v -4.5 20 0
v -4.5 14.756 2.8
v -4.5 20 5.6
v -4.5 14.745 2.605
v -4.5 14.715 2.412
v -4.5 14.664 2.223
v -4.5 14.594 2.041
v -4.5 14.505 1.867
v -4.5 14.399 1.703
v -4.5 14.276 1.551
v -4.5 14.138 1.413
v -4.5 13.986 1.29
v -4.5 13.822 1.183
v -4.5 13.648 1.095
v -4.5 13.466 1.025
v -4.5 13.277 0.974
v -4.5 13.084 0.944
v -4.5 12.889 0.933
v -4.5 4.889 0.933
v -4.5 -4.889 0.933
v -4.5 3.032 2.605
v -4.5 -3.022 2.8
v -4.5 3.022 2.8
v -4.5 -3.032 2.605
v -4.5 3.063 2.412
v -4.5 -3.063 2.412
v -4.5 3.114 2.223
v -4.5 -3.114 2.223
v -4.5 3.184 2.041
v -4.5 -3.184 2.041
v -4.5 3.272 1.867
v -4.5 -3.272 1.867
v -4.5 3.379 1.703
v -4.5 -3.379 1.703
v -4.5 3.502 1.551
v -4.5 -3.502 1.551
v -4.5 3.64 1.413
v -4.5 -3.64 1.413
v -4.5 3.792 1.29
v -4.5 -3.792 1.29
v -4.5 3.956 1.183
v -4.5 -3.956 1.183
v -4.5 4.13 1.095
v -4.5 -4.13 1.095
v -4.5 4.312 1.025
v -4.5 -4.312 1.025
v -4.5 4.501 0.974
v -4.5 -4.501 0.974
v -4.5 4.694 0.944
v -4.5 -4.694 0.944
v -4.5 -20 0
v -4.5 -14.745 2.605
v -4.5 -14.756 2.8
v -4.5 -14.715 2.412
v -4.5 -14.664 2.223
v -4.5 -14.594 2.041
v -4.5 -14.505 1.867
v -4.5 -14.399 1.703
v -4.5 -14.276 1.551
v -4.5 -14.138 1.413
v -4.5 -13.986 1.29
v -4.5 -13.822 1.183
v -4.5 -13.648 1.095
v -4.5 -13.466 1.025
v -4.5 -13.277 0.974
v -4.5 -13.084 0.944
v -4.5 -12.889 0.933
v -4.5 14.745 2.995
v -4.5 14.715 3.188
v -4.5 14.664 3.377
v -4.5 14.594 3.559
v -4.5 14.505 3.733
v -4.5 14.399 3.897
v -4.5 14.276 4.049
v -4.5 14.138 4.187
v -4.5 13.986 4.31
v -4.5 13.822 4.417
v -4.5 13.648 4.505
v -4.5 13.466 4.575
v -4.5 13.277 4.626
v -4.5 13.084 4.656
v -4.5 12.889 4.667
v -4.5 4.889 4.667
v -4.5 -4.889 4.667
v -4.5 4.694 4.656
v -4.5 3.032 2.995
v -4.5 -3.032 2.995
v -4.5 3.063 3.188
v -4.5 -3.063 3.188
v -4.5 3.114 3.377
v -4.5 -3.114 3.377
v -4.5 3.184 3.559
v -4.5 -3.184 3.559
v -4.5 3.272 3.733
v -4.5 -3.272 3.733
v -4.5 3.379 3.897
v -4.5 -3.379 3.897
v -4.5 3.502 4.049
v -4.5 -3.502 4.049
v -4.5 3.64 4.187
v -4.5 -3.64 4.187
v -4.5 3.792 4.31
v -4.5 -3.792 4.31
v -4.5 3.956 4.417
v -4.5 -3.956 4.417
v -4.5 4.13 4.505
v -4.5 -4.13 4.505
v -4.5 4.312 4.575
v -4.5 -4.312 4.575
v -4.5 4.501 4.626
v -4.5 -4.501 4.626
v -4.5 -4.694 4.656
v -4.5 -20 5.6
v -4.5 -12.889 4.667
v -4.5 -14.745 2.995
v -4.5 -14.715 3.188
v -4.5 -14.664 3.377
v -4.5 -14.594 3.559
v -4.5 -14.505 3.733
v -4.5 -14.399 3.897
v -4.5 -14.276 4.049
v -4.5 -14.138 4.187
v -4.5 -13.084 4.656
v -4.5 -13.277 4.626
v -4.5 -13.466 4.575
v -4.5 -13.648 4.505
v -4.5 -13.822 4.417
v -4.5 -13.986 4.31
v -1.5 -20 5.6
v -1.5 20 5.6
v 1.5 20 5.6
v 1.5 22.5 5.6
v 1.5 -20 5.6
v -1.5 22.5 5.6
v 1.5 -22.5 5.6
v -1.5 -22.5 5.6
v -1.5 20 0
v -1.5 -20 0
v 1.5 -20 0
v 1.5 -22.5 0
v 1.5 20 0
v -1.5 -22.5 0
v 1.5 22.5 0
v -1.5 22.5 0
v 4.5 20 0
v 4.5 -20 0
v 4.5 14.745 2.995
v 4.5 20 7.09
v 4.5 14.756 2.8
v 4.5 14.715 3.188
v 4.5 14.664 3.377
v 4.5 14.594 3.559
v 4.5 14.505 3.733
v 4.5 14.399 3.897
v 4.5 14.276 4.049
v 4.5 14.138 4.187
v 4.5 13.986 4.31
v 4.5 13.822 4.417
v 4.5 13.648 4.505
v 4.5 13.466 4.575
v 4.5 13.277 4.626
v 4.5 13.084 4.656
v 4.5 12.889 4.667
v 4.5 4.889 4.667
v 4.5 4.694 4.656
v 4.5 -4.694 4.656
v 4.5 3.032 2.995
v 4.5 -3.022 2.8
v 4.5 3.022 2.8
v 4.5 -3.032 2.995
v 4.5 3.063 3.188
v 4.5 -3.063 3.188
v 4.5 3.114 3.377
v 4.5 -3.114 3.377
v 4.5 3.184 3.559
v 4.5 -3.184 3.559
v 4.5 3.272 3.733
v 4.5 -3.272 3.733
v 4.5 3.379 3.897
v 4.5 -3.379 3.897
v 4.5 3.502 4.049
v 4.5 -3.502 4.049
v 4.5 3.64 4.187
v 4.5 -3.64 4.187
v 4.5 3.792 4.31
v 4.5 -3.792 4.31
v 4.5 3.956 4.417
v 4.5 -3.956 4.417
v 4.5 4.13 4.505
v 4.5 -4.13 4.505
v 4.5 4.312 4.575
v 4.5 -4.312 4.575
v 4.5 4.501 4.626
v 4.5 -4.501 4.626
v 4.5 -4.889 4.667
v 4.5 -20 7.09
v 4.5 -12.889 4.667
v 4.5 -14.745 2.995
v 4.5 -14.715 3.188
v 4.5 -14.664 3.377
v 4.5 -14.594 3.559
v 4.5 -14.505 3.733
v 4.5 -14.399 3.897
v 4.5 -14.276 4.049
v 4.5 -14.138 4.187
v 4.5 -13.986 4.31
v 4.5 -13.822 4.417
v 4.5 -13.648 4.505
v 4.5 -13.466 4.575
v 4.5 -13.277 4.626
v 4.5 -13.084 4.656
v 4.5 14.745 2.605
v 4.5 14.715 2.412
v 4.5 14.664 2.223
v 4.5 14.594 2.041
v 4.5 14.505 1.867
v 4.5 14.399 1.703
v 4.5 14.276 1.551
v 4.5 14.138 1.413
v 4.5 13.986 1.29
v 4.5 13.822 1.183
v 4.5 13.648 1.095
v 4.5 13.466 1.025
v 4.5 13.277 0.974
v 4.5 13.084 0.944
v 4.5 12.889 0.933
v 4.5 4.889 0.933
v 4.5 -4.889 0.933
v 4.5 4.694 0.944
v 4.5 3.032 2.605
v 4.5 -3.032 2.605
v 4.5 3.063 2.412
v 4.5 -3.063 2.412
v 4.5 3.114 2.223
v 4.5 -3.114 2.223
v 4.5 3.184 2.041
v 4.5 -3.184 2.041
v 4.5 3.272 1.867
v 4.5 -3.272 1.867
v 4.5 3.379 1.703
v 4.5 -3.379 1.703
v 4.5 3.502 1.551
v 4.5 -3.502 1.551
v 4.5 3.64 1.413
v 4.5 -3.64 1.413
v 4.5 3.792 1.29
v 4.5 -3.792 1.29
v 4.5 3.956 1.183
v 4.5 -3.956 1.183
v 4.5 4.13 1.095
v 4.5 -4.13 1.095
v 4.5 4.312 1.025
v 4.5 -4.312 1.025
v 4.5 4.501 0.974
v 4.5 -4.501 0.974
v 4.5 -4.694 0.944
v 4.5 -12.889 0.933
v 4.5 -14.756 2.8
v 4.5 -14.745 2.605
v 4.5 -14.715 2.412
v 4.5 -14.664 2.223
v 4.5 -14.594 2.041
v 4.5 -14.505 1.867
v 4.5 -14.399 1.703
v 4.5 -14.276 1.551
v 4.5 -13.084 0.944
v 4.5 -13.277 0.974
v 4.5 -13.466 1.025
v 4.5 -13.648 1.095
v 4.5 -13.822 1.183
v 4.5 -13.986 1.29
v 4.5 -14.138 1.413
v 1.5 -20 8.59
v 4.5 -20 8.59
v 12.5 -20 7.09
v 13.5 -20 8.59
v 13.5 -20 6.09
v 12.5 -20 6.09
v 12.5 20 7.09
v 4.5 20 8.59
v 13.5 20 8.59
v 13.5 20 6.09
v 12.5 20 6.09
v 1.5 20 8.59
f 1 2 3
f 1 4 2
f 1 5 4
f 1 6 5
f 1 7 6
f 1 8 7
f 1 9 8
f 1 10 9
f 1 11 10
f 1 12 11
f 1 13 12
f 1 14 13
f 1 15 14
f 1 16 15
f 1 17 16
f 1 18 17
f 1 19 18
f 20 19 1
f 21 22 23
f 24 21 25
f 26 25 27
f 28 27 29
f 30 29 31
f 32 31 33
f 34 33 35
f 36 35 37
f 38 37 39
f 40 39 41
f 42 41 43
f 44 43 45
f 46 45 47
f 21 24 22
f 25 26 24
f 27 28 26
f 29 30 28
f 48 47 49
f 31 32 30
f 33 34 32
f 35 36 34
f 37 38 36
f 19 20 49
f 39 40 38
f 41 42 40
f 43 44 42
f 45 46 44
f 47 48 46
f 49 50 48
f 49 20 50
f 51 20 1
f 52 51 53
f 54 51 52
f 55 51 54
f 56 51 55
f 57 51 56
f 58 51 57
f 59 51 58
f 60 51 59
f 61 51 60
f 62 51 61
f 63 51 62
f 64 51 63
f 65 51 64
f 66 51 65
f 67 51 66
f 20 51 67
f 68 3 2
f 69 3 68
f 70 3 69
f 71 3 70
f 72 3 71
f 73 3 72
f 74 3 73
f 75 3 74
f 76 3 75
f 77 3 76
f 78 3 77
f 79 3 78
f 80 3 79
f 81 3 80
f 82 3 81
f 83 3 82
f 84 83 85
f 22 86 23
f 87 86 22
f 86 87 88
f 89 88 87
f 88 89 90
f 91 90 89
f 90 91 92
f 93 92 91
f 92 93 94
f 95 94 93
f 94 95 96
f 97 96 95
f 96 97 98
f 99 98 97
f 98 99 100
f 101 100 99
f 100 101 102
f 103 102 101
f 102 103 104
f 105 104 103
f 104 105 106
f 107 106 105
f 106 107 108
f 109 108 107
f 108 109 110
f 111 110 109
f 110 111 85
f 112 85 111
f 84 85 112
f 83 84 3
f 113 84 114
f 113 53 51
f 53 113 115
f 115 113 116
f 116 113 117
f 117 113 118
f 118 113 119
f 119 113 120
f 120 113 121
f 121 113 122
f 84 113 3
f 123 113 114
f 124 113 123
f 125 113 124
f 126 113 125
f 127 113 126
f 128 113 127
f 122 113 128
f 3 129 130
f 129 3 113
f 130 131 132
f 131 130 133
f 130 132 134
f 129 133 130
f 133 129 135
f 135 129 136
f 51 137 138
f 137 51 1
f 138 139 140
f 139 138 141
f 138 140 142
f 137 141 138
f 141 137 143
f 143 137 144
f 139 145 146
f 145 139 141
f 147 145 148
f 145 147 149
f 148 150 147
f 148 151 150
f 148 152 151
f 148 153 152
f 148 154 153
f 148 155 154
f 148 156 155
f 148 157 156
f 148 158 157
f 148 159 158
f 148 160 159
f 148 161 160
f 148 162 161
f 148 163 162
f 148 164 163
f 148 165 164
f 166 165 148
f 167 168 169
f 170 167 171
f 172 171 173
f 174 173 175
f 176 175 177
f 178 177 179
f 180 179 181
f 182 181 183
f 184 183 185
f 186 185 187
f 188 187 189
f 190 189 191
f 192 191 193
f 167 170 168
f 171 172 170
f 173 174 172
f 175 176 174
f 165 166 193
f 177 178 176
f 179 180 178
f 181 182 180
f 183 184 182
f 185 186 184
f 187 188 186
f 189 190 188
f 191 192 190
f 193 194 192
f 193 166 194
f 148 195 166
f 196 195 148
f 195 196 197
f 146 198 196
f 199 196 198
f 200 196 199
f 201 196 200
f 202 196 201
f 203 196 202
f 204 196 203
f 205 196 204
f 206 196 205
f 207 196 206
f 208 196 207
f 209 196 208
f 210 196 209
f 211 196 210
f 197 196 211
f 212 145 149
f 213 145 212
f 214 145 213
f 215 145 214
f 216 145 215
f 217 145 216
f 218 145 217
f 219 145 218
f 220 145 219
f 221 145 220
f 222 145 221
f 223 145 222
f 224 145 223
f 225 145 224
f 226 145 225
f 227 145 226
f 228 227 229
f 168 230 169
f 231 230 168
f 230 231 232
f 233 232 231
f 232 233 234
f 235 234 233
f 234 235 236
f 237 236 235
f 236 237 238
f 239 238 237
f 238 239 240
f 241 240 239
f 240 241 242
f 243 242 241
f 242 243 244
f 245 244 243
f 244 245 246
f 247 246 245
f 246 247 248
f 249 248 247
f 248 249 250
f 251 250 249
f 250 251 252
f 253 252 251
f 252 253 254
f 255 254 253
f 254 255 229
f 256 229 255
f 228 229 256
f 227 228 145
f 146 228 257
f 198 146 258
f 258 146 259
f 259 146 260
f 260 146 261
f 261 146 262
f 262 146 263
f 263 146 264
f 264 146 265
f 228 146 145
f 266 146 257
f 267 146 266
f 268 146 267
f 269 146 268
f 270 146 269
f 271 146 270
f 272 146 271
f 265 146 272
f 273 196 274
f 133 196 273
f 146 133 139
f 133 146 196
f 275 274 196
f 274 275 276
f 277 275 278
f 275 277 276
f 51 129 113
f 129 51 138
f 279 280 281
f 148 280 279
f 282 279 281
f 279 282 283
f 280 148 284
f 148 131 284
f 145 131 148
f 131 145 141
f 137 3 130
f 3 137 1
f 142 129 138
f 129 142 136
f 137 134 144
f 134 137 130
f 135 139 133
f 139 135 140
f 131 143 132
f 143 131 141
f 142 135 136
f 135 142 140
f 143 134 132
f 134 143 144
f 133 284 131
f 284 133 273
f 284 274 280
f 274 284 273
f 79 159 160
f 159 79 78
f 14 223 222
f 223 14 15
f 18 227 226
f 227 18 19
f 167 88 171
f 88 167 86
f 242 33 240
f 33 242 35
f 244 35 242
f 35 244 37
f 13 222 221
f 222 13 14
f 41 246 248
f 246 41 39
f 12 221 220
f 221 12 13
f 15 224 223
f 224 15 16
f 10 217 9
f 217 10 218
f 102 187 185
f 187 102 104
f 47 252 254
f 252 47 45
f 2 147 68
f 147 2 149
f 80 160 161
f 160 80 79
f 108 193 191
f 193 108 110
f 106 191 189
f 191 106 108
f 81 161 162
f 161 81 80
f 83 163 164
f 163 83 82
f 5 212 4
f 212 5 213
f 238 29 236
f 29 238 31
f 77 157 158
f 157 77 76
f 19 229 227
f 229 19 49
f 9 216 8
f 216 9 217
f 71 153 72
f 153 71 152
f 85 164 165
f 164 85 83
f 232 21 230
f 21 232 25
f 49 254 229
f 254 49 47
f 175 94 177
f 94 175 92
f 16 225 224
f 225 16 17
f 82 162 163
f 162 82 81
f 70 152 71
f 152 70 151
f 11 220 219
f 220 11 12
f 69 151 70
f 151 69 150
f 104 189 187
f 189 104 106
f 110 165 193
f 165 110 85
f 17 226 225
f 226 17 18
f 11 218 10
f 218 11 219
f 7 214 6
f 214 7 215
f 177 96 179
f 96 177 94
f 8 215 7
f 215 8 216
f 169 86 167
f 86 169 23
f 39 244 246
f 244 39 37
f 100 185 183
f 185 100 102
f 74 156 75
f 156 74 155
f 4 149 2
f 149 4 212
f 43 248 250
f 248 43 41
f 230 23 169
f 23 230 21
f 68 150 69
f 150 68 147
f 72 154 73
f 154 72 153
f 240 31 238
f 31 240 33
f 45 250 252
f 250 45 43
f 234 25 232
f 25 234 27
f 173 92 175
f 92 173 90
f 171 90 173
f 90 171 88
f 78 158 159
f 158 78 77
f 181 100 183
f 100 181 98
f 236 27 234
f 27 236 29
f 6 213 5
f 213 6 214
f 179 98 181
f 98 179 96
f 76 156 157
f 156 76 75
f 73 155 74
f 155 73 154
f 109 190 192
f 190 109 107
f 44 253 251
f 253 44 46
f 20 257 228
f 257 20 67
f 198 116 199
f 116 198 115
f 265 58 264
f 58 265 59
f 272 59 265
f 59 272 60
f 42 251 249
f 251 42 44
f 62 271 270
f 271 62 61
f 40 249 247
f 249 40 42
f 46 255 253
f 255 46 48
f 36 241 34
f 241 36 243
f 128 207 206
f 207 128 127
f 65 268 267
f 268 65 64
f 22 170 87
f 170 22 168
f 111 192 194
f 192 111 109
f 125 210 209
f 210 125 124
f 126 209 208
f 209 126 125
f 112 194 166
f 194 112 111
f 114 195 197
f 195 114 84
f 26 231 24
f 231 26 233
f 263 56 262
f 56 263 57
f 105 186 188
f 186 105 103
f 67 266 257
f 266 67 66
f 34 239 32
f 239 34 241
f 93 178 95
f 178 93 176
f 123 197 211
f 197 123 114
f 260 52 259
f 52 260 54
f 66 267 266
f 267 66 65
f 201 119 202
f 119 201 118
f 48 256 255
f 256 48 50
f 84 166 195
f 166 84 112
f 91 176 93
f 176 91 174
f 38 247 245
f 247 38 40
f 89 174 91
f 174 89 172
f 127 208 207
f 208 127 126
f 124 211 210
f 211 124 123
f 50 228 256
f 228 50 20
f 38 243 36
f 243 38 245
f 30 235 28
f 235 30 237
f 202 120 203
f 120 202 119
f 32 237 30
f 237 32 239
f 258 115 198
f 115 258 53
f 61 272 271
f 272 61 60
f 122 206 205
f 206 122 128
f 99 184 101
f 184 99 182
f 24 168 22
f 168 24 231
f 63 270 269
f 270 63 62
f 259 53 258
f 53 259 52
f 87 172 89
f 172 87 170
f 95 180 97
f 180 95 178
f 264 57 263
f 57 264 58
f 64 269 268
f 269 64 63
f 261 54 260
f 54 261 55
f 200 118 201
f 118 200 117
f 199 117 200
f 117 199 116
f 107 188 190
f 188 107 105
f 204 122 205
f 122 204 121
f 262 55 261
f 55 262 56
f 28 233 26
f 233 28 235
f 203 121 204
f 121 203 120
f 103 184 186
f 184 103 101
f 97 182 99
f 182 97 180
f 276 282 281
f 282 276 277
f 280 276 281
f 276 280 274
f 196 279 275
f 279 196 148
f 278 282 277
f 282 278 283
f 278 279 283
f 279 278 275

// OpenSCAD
// file: gadgets.scad
module gadget(length, width, height, border_radius, clearance=0) {
    height = height + clearance;
    length = length + clearance;
    thickness = width / 3;
    translate([0, 0, height / 2]) {
        cube(size=[width, length, height], center=true);
        cube(size=[thickness + clearance, length + 5, height], center=true);
    }
    translate([-thickness, 0, height + border_radius / 2 - 0.01]) {
        cube(size=[thickness, length, border_radius], center=true);
    }
}

module button(length, height, depth, clearance=0) {
    module oblong(width, height, depth) {
        hull() {
            translate([0, width / 2, 0]) {
                cylinder(d=height - clearance, h=depth);
            }
            translate([0, -width / 2, 0]) {
                cylinder(d=height - clearance, h=depth);
            }
        }
    }

    oblong(length, height, depth);

    base_thickness = 1;
    translate([0, 0, -base_thickness / 2]) {
        oblong(length, height + 1, base_thickness);
    }
}

module gadget_button(length, width, height, border_radius, debug=false) {

    module switch() {
        length = 12.8;
        thickness = 5.8;
        height = 6.5;
        diameter = 2.2;
        difference() {
            cube(size=[length, thickness, height], center=true);
            rotate([90, 0, 0]) {
                for (pos = [
                    [-length / 2 + 3.15, -height / 2 + 1.5, -thickness],
                    [length / 2 - 3.15, -height / 2 + 1.5, -thickness],
                ]) {
                    translate(pos) {
                        cylinder(d=diameter, h=thickness * 2);
                    }
                }
            }
        }
    }

    module button_position() {
        for (i = [0 : $children - 1]) {
            for (pos = [
                [-(width + 2) / 2, -length / 4.5, height / 2],
                [-(width + 2) / 2, length / 4.5, height / 2],
            ]) {
                translate(pos) {
                    rotate([0, 90, 0]) {
                        children(i);
                    }
                }
            }
        }
    }

    rotate([0, 0, 180]) {
        difference() {
            gadget(length, width, height, border_radius);
            button_position() {
                button(length / 5, height / 1.5, width + 2);
            }
        }

        if (debug) {
            %button_position() {
                button(length / 5, height / 1.5, width + 2);

                translate([0, 0, -4]) {
                    rotate([0, 0, 90]) {
                        switch();
                    }
                }
            }
        }
    }

    // Create base
    base_thickness = 1.5;
    base_width = 9;
    translate([width / 2 + base_width / 2, 0, height + border_radius / 2 + base_thickness / 2 - 0.01]) {
        cube(size=[base_width, length, base_thickness], center=true);
        translate([base_width / 2 - 0.5, 0, -1]) {
            cube(size=[1, length, base_thickness], center=true);
        }
    }
}
// file: libs/cubeX.scad
//
// Simple and fast corned cube!
// Anaximandro de Godinho.
//

module cubeX( size, radius=1, rounded=true, center=false )
{
	l = len( size );
	if( l == undef )
		_cubeX( size, size, size, radius, rounded, center );
	else
		_cubeX( size[0], size[1], size[2], radius, rounded, center );
}

module _cubeX( x, y, z, r, rounded, center )
{
	if( rounded )
		if( center )
			translate( [-x/2, -y/2, -z/2] )
			__cubeX( x, y, z, r );
		else
			__cubeX( x, y, z, r );
	else
		cube( [x, y, z], center );
}

module __cubeX(	x, y, z, r )
{
	//TODO: discount r.
	rC = r;
	hull()
	{
		translate( [rC, rC, rC] )
			sphere( r );
		translate( [rC, y-rC, rC] )
			sphere( r );
		translate( [rC, rC, z-rC] )
			sphere( r );
		translate( [rC, y-rC, z-rC] )
			sphere( r );

		translate( [x-rC, rC, rC] )
			sphere( r );
		translate( [x-rC, y-rC, rC] )
			sphere( r );
		translate( [x-rC, rC, z-rC] )
			sphere( r );
		translate( [x-rC, y-rC, z-rC] )
			sphere( r );
	}
}
// main file
use <libs/cubeX.scad>
use <gadgets.scad>

$fn = 60;

DEBUG = false;

/* BEGIN e-Paper defintion
 *
 * Screen information https://www.waveshare.com/product/displays/e-paper/7.5inch-e-paper.htm
 * https://www.waveshare.com/product/displays/e-paper/7.5inch-e-paper.htm
 * https://www.waveshare.com/wiki/File:7.5inch-e-paper-specification.pdf
 * https://www.waveshare.com/w/upload/6/60/7.5inch_e-Paper_V2_Specification.pdf
 */
OUTLINE_LENGTH = 170.2;
OUTLINE_WIDTH = 111.2;
OUTLINE_THICKNESS = 1.18;

// Display Active Area
AA_LENGTH = 163.2;
AA_WIDTH = 97.92;

// Active Area is not centered
// 1.2 + 1.5 + 0.8: see specification "1.4 Mechanical Drawing of EPD module"
AA_BORDER_OFFSET = 1.2 + 1.5 + 0.8;
/*  END e-Paper defintion
 */

BORDER_HORIZONTAL = 10;
BORDER_VERTICAL = 14;

LENGTH = AA_LENGTH + BORDER_HORIZONTAL * 2;
WIDTH = AA_WIDTH + BORDER_VERTICAL * 2;

FRONT_THICKNESS = 3.5;

CASE_HEIGHT = 9.6;
CASE_THICKNESS = 1.;
CASE_WALL_THICKNESS = 9;

// Must be less than or equal to front thickness
BORDER_RADIUS = 3;

// Dept
DISPLAY_DEPTH = 2;

SCREEN_OFFSET = 3;

GADGET_HEIGHT = CASE_HEIGHT - BORDER_RADIUS - CASE_THICKNESS;
GADGET_WIDTH = CASE_WALL_THICKNESS;
GADGET_LENGTH = 40;

/*  Inserts definition
 */
INSERT_THREAD_DIAMETER = 2;
INSERT_DIAMETER = 3.45;
INSERT_HEIGHT = 4;


module dummy_screen(length, width, thickness, active_area_length, active_area_width, border_offset) {
    color("RED")
    cube(size=[length, width, thickness], center=true);

    color("BLACK")
    translate([0, (length - active_area_length) - border_offset, .1]) {
        cube(size=[length, width, 1], center=true);
    }

    // Display connector
    color("BLUE")
    translate([0, -width / 2, 0]) {
        cube(size=[22.04, 5, 1], center=true);
    }
}

module frame(active_area_length, active_area_width, front_thickness, display_depth) {
    // Frame opening
    opening = 6;

    // Height of the closest part of the active area
    base = 1;

    // Clearance between frame border and active area
    clearance = 0.3;

    cube(size=[AA_LENGTH + clearance, AA_WIDTH + clearance, FRONT_THICKNESS * 2], center=true);
    hull() {
        translate([0, 0, base]) {
            cube(size=[AA_LENGTH + clearance, AA_WIDTH + clearance, .01], center=true);
        }
        translate([0, 0, DISPLAY_DEPTH]) {
            cube(size=[AA_LENGTH + opening, AA_WIDTH + opening, .01], center=true);
        }
    }
}

module holes_position() {
    // Holes
    for (pos = [
        [LENGTH / 2 - BORDER_HORIZONTAL / 2 + INSERT_DIAMETER / 2, WIDTH / 2 - BORDER_VERTICAL / 2 + INSERT_DIAMETER, 0],
        [LENGTH / 2 - BORDER_HORIZONTAL / 2 + INSERT_DIAMETER / 2, -(WIDTH / 2 - BORDER_VERTICAL / 2 + INSERT_DIAMETER), 0],
        [-(LENGTH / 2 - BORDER_HORIZONTAL / 2 + INSERT_DIAMETER / 2), WIDTH / 2 - BORDER_VERTICAL / 2 + INSERT_DIAMETER, 0],
        [-(LENGTH / 2 - BORDER_HORIZONTAL / 2 + INSERT_DIAMETER / 2), -(WIDTH / 2 - BORDER_VERTICAL / 2 + INSERT_DIAMETER), 0],

        [(LENGTH / 2 - BORDER_HORIZONTAL / 2 + INSERT_DIAMETER / 2), 0, 1],
        [-(LENGTH / 2 - BORDER_HORIZONTAL / 2 + INSERT_DIAMETER / 2), 0, 1],

        [0, WIDTH / 2 - BORDER_VERTICAL / 2 + INSERT_DIAMETER, 1],
        [LENGTH / 4, WIDTH / 2 - BORDER_VERTICAL / 2 + INSERT_DIAMETER, 1],
        [-LENGTH / 4, WIDTH / 2 - BORDER_VERTICAL / 2 + INSERT_DIAMETER, 1],

        [LENGTH / 4, -(WIDTH / 2 - BORDER_VERTICAL / 2 + INSERT_DIAMETER), 1],
        [-LENGTH / 4, -(WIDTH / 2 - BORDER_VERTICAL / 2 + INSERT_DIAMETER), 1],
    ]) {
        translate([pos[0], pos[1], 0]) {
            if ($children > 1) {
                children(pos[2]);
            } else {
                children(0);
            }
        }
    }
}

/**
 *  Create the front of the case 
 *
 *  Arguments:
 *  - length            Length of the front
 *  - width             Width of the front
 *  - outline_length    Screen outline length
 *  - outline_width     Screen outline width
 *  - aa_length         Screen active area length
 *  - aa_width          Screen active area width
 *  - front_thickness   The front thickness
 *  - display_depth     TODO
 *  - border_offset     Active area is not centered
 *  - screen_offset     Screen is not vertically centered
 *  - border_radius     Border radius of the corner
 */
module front(length, width, outline_length, outline_width, aa_length, aa_width, front_thickness, display_depth, border_offset, screen_offset, border_radius) {
    clearance = 0.6;

    assert(border_radius <= front_thickness);

    difference() {
        union() {
            difference() {
                cubeX([length, width, front_thickness * 2], radius=border_radius, center=true);
                translate([0, 0, - front_thickness / 2]) {
                    cube([length, width, front_thickness], center=true);
                }
            }
        }

        translate([0, screen_offset, 0]) {
            // Screen opening
            translate([0, - border_offset, front_thickness / 2 - display_depth]) {
                cube([outline_length + clearance, outline_width + clearance, front_thickness], center=true);

                // Display connector
                translate([0, -outline_width / 2, 0]) {
                    cube([40, 6, front_thickness], center=true);
                }
            }

            // Display opening
            translate([0, 0, front_thickness - display_depth]) {
                frame(aa_length, aa_width, front_thickness, display_depth);
            }
        }

        holes_position() {
            translate([0, 0, front_thickness - 1 - INSERT_HEIGHT]) {
                cylinder(d=INSERT_DIAMETER, h=INSERT_HEIGHT);
            }
        }
    }
}

module fixation(height=CASE_HEIGHT) {
    large_diameter = 6;
    small_diameter = 2.8;
    translate([0, 0, 0]) {
        cylinder(d=large_diameter, h=height);
    }
    translate([0, 3, height / 2]) {
        cube(size=[small_diameter, 7, height], center=true);
    }
    translate([0, 6, 0]) {
        cylinder(d=small_diameter, h=height);
    }
}

module case() {

    module fixation_position() {
        translate([0, WIDTH / 2 - 25, CASE_HEIGHT]) {
            for (i = [0 : $children - 1]) {
                children(i);
            }
        }
    }

    difference() {
        cubeX([LENGTH, WIDTH, CASE_HEIGHT * 2], radius=BORDER_RADIUS, center=true);
        translate([0, 0, - CASE_HEIGHT / 2]) {
            cube([LENGTH, WIDTH, CASE_HEIGHT], center=true);
        }

        translate([0, 0, CASE_HEIGHT / 2 - CASE_THICKNESS / 2 - .01]) {
            cube([LENGTH - CASE_WALL_THICKNESS * 2, WIDTH - CASE_WALL_THICKNESS * 2, CASE_HEIGHT - CASE_THICKNESS], center=true);
        }

        holes_position() {
            union() {
                translate([0, 0, -CASE_HEIGHT / 2]) {
                    cylinder(d=INSERT_THREAD_DIAMETER, h=CASE_HEIGHT * 2);
                }
                translate([0, 0, CASE_HEIGHT / 2]) {
                    cylinder(d=4.6, h=CASE_HEIGHT * 2);
                }
                translate([0, 0, -0.01]) {
                    cylinder(d=INSERT_DIAMETER * 1.3, h=2.25);
                }
            }
            cylinder(d=0, h=0); // Dummy one
        }

        fixation_position() {
            translate([0, 0, -CASE_THICKNESS * 2 - 1]) {
                fixation(); 
            }
        }

        for (pos = [
            [[LENGTH / 2 - CASE_WALL_THICKNESS / 2, WIDTH / 4 - 3, -0.001], 0],
            [[-LENGTH / 2 + CASE_WALL_THICKNESS / 2, WIDTH / 4 - 3, -0.001], 180],
            [[LENGTH / 2 - CASE_WALL_THICKNESS / 2, -WIDTH / 4 + 3, -0.001], 0],
            [[-LENGTH / 2 + CASE_WALL_THICKNESS / 2, -WIDTH / 4 + 3, -0.001], 180],
        ]) {
            translate(pos[0]) {
                scale([1.01, 1, 1.01]) {
                    rotate([0, 0, pos[1]]) {
                        gadget(GADGET_LENGTH, GADGET_WIDTH, GADGET_HEIGHT, BORDER_RADIUS, 0.3);
                    }
                }
            }
        }

        // Display connector
        translate([0, -OUTLINE_WIDTH / 2, 0]) {
            cube([40, 6, CASE_HEIGHT], center=true);
        }
    }

    holes_position() {
        cylinder(d=0, h=0); // Dummy one
        sphere(d=INSERT_DIAMETER - 0.1);
    }

    fixation_position() {
        difference() {
            translate([0, 2, -CASE_THICKNESS * 2]) {
                cylinder(d=15, h=CASE_THICKNESS);
            }
            translate([0, 0, -2.1]) {
                fixation();
            }
        }

        translate([0, 2, -CASE_THICKNESS * 2 - 4]) {
            difference() {
                cylinder(d=15, h=5);
                translate([0, 0, 1]) {
                    cylinder(d=12, h=5);
                }
            }
        }
    }

    if (DEBUG) {
        translate([-LENGTH / 2 + CASE_WALL_THICKNESS / 2, WIDTH / 4 - 3, -0.001]) {
            gadget_button(GADGET_LENGTH, GADGET_WIDTH, GADGET_HEIGHT, BORDER_RADIUS, DEBUG);
        }

        for (pos = [
            [[LENGTH / 2 - CASE_WALL_THICKNESS / 2, WIDTH / 4 - 3, -0.001], 0],
            [[LENGTH / 2 - CASE_WALL_THICKNESS / 2, -WIDTH / 4 + 3, -0.001], 0],
            [[-LENGTH / 2 + CASE_WALL_THICKNESS / 2, -WIDTH / 4 + 3, -0.001], 180],
        ]) {
            translate(pos[0]) {
                rotate([0, 0, pos[1]]) {
                    gadget(GADGET_LENGTH, GADGET_WIDTH, GADGET_HEIGHT, BORDER_RADIUS);
                }
            }
        }
    }
}

module demo() {
    front(LENGTH, WIDTH, OUTLINE_LENGTH, OUTLINE_WIDTH, AA_LENGTH, AA_WIDTH, FRONT_THICKNESS, DISPLAY_DEPTH, AA_BORDER_OFFSET, SCREEN_OFFSET, BORDER_RADIUS);
    %translate([0, SCREEN_OFFSET - AA_BORDER_OFFSET, FRONT_THICKNESS - DISPLAY_DEPTH]) {
        dummy_screen(OUTLINE_LENGTH, OUTLINE_WIDTH, OUTLINE_THICKNESS, AA_LENGTH, AA_WIDTH, AA_BORDER_OFFSET);
    }

    translate([0, 0, -5]) {
        rotate([0, 180, 0]) {
            case();
        }
    }
}

front(LENGTH, WIDTH, OUTLINE_LENGTH, OUTLINE_WIDTH, AA_LENGTH, AA_WIDTH, FRONT_THICKNESS, DISPLAY_DEPTH, AA_BORDER_OFFSET, SCREEN_OFFSET, BORDER_RADIUS);
demo();
//frame(AA_LENGTH, AA_WIDTH, FRONT_THICKNESS, DISPLAY_DEPTH);
case();
gadget(GADGET_LENGTH, GADGET_WIDTH, GADGET_HEIGHT, BORDER_RADIUS);
!gadget_button(GADGET_LENGTH, GADGET_WIDTH, GADGET_HEIGHT, BORDER_RADIUS, true);
button(GADGET_LENGTH / 5, GADGET_HEIGHT / 1.5, GADGET_WIDTH + 2, 0.25);

intersection() {
    case();
    translate([-LENGTH / 2, WIDTH / 4, 10]) {
        cube(size=[30, 55, 23], center=true);
    }
}
